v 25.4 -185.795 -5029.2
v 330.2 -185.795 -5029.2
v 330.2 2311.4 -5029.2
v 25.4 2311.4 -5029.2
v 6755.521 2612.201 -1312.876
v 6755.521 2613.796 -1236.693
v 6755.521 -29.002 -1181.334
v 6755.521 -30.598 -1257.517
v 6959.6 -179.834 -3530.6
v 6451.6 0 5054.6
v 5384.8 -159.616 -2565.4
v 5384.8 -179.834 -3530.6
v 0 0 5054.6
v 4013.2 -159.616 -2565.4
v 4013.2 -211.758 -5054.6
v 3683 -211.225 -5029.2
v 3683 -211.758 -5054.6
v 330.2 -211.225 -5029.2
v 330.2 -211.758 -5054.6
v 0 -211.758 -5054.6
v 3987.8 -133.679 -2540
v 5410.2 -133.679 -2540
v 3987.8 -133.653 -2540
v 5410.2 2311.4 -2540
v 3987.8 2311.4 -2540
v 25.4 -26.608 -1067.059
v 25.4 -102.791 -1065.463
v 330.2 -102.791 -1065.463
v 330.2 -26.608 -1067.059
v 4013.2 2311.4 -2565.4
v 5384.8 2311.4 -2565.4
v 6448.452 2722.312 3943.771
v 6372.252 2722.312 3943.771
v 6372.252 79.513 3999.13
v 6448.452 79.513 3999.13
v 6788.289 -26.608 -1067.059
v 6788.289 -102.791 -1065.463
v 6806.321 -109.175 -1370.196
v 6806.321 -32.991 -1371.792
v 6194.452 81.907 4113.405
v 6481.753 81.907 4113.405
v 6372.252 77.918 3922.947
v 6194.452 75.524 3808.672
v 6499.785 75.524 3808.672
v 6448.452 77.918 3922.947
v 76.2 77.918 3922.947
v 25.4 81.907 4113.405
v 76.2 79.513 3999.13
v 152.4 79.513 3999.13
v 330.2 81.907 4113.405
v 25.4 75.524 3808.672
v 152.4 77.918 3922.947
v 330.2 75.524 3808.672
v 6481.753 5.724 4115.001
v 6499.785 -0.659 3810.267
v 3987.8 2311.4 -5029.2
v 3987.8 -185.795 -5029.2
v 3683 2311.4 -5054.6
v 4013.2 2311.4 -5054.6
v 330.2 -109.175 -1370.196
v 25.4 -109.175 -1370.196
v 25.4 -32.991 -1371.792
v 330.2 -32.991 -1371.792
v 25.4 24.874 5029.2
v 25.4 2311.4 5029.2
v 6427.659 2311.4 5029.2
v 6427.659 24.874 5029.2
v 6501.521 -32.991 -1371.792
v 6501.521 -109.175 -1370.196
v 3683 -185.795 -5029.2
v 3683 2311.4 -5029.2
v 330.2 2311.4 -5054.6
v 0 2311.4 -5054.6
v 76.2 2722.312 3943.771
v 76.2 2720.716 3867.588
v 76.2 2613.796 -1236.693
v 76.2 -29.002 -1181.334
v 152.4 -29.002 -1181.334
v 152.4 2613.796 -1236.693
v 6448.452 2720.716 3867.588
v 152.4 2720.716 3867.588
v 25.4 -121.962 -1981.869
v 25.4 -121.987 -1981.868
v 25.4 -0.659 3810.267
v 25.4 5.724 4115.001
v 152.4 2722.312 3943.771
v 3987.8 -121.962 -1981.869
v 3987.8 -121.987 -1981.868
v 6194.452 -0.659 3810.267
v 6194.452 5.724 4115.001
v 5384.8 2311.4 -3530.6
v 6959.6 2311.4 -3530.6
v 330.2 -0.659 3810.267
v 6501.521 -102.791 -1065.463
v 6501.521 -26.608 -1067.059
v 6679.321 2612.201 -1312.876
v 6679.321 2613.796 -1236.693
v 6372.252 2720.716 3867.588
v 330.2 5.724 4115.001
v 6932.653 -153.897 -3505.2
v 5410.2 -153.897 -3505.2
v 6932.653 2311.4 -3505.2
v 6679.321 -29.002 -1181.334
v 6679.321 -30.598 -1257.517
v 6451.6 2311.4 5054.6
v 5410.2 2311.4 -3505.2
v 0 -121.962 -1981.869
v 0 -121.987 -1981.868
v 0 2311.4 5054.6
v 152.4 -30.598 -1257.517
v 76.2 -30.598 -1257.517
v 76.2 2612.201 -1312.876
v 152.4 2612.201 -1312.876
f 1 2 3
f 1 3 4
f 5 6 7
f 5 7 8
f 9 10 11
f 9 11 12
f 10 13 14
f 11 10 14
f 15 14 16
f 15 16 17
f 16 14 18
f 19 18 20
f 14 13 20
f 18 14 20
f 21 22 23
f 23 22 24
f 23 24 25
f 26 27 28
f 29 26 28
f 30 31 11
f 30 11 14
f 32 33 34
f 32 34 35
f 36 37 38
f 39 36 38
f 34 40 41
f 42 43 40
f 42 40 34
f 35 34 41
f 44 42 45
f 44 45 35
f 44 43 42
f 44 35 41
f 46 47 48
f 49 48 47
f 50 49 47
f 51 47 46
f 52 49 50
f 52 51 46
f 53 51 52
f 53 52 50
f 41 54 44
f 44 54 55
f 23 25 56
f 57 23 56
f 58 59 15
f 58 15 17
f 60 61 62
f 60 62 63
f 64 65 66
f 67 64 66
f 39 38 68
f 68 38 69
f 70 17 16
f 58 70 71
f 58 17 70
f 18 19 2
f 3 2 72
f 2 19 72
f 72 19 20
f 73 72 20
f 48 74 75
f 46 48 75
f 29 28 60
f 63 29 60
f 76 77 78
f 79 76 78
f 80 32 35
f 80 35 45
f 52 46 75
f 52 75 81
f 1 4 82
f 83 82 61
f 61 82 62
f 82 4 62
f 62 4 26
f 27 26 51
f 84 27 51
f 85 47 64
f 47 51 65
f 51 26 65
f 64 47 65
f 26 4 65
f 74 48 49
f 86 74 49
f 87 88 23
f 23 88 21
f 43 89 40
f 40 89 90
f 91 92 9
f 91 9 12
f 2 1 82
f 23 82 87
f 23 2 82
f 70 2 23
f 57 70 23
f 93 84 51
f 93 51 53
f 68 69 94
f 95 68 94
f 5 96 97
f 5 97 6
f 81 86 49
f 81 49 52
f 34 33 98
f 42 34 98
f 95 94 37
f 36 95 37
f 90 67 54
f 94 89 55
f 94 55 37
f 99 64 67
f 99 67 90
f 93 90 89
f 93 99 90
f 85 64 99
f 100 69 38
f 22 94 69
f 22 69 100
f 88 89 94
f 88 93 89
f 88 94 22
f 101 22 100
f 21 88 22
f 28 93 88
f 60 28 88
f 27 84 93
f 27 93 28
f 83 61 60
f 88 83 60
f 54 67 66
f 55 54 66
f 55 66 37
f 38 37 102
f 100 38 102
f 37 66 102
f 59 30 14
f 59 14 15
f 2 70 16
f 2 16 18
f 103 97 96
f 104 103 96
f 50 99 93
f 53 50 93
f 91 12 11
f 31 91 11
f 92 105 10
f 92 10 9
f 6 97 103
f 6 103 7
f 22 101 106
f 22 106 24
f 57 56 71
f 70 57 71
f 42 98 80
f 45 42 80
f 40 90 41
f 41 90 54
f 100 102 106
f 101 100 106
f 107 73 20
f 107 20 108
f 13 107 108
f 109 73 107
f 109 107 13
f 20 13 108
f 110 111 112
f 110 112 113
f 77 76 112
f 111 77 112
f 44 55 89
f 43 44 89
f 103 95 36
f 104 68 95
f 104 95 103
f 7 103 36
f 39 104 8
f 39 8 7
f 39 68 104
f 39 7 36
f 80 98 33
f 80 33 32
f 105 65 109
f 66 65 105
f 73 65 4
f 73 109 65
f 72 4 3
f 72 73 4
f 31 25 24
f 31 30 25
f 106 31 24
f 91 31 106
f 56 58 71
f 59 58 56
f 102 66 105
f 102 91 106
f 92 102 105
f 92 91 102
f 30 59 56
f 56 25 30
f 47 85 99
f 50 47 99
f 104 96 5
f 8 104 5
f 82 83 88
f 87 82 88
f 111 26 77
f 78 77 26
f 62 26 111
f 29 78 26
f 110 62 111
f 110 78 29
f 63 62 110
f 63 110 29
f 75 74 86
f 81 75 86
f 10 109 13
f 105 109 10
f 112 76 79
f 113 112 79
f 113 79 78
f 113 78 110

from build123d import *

# Parameters (mm, degrees)
BOSS_EXTRUDE2_DEPTH      = 2311.4
BOSS_EXTRUDE2_DEPTH_BACK = 254
CUT_EXTRUDE1_DEPTH       = 8907.603352569
SHELL3_T                 = -25.4
SKETCH5_W                = 304.8
SKETCH5_H                = 304.8
BOSS_EXTRUDE4_DEPTH      = 76.2
SKETCH6_W                = 76.2
SKETCH6_H                = 76.2
BOSS_EXTRUDE6_DEPTH      = 2643.378
BOSS_EXTRUDE7_DEPTH      = 0.0254
SKETCH8_W                = 3352.8
SKETCH8_H                = 2523.157553015
CUT_EXTRUDE2_DEPTH       = 25.4


with BuildPart() as part:
    # Sketch2 → Boss-Extrude2 (new, two sides)
    with BuildSketch(Plane(origin=(0, 0, 0), x_dir=(1, 0, 0), z_dir=(0, 1, 0))) as boss_extrude2_sk:
        Polygon((0, 5054.6), (0, -5054.6), (6451.6, -5054.6), (6959.6, 3530.6), (5384.8, 3530.6), (5384.8, 2565.4), (4013.2, 2565.4), (4013.2, 5054.6), align=None)
    extrude(amount=BOSS_EXTRUDE2_DEPTH)
    extrude(boss_extrude2_sk.sketch, amount=-BOSS_EXTRUDE2_DEPTH_BACK)

    # Sketch4 → Cut-Extrude1 (cut, through all)
    with BuildSketch(Plane.ZY):
        Polygon((5054.6, 0), (-5054.6, -211.757553015), (-5054.6, -254), (5054.6, -254), align=None)
    extrude(amount=-CUT_EXTRUDE1_DEPTH, mode=Mode.SUBTRACT)

    # Shell3
    shell3_openings = [part.faces().sort_by_distance(p)[0] for p in [
        (3193.672214635, 2311.4, 297.114656183),
    ]]
    offset(amount=SHELL3_T, openings=shell3_openings, kind=Kind.INTERSECTION)

    # Sketch5 → Boss-Extrude4 (add)
    with BuildSketch(Plane(origin=(0, -80.43791031, 1.684934026), x_dir=(1, 0, 0), z_dir=(0, 0.9997806834748456, -0.020942419883350005))):
        with Locations((177.8, -3961.817924984)):
            Rectangle(SKETCH5_W, SKETCH5_H)
        with Locations((177.8, 1219.782075016)):
            Rectangle(SKETCH5_W, SKETCH5_H)
        Polygon((6501.521028173, 1067.382075016), (6788.289480699, 1067.382075016), (6806.321028173, 1372.182075016), (6501.521028173, 1372.182075016), align=None)
        Polygon((6194.451826209, -4114.217924984), (6481.753173628, -4114.217924984), (6499.784721103, -3809.417924984), (6194.451826209, -3809.417924984), align=None)
    extrude(amount=BOSS_EXTRUDE4_DEPTH)

    # Sketch6 → Boss-Extrude6 (add)
    with BuildSketch(Plane(origin=(0, -4.254622229, 0.089121631), x_dir=(1, 0, 0), z_dir=(0, 0.9997806834748456, -0.02094241988335002))):
        with Locations((114.3, 1219.782075016)):
            Rectangle(SKETCH6_W, SKETCH6_H)
        with Locations((114.3, -3961.817924984)):
            Rectangle(SKETCH6_W, SKETCH6_H)
        with Locations((6410.351826209, -3961.817924984)):
            Rectangle(SKETCH6_W, SKETCH6_H)
        with Locations((6717.421028173, 1219.782075016)):
            Rectangle(SKETCH6_W, SKETCH6_H)
    extrude(amount=BOSS_EXTRUDE6_DEPTH)

    # Sketch7 → Boss-Extrude7 (add)
    with BuildSketch(Plane(origin=(0, -80.43791031, 1.684934026), x_dir=(1, 0, 0), z_dir=(0, 0.9997806834748456, -0.020942419883350005))):
        Polygon((0, 1983.988532266), (3987.8, 1983.988532266), (3987.8, 5031.988532266), (25.4, 5031.988532266), align=None)
    extrude(amount=BOSS_EXTRUDE7_DEPTH)

    # Sketch8 → Cut-Extrude2 (cut)
    with BuildSketch(Plane(origin=(0, 0, -5054.6), x_dir=(-1, 0, 0), z_dir=(0, 0, -1))):
        with Locations((-2006.6, 1049.821223492)):
            Rectangle(SKETCH8_W, SKETCH8_H)
    extrude(amount=-CUT_EXTRUDE2_DEPTH, mode=Mode.SUBTRACT)


solid = part.part
